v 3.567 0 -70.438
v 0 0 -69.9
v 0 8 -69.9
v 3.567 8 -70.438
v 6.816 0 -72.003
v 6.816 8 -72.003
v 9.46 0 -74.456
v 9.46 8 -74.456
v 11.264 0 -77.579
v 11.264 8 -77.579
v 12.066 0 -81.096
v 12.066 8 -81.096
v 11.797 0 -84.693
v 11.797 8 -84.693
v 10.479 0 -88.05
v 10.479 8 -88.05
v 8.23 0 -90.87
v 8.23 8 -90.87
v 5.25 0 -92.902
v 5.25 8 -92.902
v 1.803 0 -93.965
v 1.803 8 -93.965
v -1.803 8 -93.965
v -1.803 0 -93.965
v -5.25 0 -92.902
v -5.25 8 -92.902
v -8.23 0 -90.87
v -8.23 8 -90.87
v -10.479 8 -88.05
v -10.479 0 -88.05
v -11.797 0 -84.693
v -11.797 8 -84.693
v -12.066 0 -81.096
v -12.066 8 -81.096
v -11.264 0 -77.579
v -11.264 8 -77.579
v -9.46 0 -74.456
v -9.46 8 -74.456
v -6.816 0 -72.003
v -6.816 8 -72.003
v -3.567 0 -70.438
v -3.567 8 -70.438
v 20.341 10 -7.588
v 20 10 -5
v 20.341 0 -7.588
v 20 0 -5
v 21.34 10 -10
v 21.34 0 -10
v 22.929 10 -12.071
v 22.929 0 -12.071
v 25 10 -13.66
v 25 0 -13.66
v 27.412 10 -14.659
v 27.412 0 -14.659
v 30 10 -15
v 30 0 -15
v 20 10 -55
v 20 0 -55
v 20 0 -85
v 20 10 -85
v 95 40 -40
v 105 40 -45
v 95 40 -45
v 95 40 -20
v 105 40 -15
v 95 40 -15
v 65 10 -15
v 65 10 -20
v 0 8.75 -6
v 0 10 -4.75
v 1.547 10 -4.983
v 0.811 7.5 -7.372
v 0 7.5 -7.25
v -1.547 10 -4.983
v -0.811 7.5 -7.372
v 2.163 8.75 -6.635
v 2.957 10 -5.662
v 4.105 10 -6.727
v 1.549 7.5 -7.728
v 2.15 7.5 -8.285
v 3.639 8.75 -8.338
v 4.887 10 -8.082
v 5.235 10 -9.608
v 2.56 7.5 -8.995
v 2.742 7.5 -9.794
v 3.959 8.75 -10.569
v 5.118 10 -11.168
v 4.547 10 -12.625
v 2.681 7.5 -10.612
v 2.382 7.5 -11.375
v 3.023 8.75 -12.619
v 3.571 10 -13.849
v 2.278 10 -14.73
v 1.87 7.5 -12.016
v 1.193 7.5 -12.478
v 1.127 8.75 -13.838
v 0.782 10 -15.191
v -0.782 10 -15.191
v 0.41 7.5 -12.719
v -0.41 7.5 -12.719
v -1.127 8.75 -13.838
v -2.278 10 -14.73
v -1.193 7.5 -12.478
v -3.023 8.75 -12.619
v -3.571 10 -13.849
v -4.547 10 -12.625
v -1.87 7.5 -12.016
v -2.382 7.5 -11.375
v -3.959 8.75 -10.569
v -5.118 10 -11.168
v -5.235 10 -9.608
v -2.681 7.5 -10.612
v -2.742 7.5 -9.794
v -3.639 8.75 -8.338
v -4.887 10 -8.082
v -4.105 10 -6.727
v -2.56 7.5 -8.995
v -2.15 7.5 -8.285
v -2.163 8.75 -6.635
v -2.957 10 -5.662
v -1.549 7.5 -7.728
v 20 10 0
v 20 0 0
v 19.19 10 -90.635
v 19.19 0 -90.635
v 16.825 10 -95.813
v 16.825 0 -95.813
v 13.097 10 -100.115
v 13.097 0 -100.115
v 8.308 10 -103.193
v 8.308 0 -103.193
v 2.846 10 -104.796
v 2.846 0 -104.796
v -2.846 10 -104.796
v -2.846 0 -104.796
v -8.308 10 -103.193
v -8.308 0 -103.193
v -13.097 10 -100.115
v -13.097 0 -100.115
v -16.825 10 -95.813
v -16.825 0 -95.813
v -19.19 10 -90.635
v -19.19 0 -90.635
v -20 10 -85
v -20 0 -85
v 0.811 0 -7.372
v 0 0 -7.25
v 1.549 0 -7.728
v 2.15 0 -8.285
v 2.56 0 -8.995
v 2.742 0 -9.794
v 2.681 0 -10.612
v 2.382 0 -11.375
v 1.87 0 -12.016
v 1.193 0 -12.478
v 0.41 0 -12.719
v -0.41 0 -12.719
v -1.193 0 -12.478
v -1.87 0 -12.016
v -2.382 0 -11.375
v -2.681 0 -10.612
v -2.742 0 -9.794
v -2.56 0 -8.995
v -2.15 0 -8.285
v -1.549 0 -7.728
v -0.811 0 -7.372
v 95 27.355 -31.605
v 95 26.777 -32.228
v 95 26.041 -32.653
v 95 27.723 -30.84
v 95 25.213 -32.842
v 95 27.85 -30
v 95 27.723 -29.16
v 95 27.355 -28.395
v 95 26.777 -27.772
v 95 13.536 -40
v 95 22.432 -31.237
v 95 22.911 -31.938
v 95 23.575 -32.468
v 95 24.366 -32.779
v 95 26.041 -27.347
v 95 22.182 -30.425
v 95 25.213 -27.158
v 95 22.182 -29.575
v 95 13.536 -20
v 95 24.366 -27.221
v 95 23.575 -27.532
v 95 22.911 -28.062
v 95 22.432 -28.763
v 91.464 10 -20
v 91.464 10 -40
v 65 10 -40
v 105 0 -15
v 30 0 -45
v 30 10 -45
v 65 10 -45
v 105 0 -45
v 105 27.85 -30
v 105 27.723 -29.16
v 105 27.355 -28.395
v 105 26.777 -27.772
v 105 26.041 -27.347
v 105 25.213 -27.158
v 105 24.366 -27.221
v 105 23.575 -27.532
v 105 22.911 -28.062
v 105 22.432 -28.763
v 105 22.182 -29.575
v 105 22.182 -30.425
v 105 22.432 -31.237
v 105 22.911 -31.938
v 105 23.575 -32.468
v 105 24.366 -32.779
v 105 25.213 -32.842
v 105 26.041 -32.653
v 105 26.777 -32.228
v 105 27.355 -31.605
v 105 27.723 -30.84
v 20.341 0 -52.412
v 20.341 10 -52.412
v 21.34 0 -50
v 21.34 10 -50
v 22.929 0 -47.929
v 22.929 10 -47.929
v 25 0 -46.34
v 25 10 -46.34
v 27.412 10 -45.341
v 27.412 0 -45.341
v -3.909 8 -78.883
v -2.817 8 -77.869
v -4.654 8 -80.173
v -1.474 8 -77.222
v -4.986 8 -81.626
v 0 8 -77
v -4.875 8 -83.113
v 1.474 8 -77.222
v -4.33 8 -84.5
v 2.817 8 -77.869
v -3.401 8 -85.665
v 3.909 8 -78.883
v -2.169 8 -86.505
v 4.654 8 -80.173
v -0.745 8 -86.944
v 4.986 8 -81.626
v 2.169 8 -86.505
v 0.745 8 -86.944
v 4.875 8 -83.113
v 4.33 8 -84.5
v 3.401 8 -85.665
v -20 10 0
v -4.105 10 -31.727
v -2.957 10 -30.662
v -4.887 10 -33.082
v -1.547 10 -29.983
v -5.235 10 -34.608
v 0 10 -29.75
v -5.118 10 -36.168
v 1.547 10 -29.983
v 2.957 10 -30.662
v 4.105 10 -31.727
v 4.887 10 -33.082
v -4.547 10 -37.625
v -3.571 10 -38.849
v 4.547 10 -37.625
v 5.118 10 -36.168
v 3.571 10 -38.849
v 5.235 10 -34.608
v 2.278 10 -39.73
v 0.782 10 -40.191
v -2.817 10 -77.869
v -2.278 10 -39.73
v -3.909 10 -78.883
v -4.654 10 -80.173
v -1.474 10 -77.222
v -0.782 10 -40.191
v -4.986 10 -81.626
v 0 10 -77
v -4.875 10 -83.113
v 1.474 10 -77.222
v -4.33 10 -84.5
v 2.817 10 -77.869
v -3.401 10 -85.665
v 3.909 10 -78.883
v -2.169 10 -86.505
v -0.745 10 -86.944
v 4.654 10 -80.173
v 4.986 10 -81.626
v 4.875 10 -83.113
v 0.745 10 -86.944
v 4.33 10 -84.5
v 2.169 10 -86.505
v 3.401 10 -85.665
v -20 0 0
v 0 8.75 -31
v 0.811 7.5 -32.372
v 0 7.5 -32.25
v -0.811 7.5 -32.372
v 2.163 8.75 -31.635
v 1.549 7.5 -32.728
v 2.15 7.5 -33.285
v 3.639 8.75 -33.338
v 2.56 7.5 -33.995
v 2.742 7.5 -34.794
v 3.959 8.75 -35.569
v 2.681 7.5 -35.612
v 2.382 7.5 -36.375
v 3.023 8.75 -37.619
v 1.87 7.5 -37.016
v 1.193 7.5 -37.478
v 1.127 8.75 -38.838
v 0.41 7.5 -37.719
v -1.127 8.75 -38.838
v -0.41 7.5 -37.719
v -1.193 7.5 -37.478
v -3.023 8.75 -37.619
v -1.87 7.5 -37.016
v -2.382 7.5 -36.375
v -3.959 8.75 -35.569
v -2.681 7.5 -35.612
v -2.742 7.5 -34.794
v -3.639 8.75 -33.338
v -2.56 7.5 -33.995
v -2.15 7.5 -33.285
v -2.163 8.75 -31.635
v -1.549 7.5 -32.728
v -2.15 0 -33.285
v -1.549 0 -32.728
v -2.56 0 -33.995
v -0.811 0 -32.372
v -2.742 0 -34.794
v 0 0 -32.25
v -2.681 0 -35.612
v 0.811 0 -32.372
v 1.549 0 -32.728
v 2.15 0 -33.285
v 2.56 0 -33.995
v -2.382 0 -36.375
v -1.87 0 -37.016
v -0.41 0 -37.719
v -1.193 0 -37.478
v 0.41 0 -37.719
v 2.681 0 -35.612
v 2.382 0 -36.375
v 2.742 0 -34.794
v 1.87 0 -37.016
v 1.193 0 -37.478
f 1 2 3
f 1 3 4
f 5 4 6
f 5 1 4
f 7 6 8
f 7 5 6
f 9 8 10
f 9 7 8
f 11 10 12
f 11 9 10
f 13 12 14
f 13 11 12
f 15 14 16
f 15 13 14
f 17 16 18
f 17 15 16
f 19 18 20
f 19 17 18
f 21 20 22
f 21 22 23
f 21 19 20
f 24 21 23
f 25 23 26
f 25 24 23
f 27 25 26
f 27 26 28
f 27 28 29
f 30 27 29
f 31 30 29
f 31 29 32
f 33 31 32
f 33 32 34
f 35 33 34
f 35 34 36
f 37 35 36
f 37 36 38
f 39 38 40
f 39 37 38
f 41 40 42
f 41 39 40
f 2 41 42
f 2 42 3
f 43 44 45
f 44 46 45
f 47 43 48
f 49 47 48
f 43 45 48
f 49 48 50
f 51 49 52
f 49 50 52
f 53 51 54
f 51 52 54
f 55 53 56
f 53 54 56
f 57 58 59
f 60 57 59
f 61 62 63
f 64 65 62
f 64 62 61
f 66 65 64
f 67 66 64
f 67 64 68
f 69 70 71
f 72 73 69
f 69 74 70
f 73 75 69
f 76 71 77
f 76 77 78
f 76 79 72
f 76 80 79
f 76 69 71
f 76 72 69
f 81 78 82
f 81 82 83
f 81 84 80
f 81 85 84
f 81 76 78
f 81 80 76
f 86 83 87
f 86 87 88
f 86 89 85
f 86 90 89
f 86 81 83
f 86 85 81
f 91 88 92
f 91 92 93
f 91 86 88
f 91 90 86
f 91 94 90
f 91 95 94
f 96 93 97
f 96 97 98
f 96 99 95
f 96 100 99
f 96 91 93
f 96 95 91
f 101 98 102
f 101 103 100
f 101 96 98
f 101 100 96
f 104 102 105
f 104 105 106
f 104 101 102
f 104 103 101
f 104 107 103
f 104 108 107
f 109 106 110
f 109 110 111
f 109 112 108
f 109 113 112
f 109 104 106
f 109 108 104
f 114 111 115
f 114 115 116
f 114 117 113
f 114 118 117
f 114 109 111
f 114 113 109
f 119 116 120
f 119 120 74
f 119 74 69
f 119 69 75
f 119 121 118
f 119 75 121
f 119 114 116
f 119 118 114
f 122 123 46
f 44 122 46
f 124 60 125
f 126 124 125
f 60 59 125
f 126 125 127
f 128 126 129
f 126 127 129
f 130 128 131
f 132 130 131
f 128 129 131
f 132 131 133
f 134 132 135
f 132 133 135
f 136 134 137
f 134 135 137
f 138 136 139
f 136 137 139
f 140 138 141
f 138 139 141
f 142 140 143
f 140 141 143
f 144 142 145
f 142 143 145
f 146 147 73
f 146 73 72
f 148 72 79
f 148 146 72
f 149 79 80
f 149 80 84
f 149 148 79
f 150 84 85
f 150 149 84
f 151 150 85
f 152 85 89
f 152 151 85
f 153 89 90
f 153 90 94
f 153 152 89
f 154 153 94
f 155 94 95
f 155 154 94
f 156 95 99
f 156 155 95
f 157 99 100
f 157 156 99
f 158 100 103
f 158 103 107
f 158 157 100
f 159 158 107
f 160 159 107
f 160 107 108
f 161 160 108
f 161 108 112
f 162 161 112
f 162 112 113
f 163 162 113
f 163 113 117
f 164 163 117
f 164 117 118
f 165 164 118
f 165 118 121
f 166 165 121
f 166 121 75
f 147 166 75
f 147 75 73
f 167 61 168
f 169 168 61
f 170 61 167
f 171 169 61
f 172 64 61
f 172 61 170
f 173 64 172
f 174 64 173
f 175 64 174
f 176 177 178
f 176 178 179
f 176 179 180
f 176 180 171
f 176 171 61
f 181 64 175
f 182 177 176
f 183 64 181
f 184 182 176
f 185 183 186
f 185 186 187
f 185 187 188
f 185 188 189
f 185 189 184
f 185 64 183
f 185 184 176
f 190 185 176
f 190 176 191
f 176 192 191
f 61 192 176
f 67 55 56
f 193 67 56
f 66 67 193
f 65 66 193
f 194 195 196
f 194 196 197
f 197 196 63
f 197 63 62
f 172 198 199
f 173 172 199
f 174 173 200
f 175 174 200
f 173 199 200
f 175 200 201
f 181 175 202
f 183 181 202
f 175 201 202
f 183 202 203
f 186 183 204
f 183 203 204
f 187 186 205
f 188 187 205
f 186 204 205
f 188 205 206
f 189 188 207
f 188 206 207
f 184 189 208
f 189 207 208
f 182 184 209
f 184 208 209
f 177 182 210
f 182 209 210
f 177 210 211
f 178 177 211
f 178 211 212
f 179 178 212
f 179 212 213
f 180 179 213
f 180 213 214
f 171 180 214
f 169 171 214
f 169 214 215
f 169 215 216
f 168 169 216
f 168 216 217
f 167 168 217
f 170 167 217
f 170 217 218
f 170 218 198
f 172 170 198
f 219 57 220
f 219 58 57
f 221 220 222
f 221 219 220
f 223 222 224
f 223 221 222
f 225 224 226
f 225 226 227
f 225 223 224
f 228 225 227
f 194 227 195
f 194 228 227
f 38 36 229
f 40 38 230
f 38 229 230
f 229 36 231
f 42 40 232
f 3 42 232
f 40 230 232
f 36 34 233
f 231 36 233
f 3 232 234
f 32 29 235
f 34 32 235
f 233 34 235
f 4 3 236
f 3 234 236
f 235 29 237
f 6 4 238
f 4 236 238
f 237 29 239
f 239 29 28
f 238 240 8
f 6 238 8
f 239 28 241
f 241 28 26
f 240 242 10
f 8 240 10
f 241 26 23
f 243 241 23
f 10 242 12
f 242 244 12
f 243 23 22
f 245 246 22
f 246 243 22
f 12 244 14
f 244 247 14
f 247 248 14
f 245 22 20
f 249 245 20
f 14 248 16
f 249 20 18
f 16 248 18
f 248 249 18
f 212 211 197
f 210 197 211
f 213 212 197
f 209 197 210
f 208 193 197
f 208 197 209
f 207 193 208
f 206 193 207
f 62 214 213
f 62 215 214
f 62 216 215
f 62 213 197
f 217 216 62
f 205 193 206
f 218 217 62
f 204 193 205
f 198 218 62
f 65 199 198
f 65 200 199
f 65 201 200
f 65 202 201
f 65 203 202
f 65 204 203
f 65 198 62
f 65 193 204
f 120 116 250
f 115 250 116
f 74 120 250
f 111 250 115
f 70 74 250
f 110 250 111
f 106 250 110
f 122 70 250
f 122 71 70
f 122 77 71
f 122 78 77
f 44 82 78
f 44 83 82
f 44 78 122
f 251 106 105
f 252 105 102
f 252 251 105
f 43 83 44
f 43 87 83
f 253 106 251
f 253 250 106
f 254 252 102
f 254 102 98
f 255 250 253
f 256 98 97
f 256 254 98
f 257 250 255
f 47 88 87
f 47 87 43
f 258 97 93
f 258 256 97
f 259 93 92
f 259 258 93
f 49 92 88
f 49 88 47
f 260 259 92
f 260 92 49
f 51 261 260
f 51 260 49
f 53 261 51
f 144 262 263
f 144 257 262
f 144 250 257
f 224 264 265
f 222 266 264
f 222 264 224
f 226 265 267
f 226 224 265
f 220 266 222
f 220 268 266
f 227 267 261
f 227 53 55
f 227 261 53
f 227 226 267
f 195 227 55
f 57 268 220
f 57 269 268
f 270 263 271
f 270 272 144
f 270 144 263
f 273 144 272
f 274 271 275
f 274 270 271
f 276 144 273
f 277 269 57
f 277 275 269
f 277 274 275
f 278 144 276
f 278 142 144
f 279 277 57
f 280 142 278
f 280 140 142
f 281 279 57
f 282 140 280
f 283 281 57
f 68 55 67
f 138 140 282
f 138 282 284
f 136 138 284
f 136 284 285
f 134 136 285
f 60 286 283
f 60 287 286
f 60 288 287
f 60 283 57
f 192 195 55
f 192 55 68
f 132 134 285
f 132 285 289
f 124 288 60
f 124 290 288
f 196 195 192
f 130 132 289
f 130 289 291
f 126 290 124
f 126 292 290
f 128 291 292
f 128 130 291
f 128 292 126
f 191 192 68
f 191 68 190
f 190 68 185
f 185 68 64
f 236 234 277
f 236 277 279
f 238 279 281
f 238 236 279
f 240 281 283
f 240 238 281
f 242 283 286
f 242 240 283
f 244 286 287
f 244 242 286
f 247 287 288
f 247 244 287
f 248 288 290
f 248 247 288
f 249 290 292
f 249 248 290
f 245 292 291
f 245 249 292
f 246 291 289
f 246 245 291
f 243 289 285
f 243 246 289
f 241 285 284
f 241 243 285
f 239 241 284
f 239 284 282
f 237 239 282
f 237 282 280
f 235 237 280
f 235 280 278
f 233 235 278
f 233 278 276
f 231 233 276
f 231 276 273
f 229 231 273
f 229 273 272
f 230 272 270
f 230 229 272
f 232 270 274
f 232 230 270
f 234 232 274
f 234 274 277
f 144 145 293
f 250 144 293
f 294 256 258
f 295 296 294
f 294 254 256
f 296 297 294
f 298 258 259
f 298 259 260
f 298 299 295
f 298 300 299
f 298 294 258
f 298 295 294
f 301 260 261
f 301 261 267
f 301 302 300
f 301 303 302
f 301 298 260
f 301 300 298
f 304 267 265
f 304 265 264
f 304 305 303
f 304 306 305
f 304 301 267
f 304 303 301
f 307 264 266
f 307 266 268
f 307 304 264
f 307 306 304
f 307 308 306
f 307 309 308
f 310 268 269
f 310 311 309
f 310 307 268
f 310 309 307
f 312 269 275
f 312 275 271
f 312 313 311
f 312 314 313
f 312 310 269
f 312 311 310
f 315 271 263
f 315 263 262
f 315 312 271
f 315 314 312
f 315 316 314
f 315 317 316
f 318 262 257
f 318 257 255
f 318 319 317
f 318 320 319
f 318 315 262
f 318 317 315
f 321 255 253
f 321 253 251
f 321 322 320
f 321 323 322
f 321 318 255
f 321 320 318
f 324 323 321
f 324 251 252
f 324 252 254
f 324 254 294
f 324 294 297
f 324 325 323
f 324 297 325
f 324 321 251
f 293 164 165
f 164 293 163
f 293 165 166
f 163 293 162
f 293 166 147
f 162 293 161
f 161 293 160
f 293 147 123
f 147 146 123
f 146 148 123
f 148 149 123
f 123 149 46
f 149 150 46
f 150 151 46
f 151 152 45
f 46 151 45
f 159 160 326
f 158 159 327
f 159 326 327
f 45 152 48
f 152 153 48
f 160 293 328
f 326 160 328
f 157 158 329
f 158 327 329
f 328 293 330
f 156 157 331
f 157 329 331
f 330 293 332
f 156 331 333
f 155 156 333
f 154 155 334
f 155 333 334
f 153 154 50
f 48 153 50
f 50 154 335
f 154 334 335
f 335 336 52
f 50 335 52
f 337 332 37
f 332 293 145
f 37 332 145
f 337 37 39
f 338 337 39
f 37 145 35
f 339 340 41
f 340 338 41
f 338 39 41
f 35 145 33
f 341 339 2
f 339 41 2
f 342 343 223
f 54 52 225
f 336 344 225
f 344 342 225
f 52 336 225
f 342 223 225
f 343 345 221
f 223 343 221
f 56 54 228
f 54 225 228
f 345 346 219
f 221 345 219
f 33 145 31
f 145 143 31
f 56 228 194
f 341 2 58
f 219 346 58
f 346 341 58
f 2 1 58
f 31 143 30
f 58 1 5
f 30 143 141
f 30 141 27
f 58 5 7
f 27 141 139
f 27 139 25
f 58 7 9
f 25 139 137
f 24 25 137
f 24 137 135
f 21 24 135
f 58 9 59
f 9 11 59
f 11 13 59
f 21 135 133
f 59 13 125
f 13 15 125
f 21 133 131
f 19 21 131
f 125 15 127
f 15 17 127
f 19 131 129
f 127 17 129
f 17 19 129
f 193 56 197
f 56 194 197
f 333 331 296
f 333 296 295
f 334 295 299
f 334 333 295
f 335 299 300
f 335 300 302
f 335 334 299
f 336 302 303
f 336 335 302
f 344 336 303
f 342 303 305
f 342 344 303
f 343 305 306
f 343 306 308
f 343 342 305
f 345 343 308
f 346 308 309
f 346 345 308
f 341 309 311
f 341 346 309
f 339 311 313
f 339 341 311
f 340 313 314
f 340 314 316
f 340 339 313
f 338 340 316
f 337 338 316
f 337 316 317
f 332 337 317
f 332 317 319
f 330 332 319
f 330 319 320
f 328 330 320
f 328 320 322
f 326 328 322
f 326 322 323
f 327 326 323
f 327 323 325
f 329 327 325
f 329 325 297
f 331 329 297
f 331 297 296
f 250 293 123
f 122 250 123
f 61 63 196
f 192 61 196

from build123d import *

# Parameters (mm, degrees)
SKETCH1_R           = 2.75
SKETCH1_R_2         = 12.1
BOSS_EXTRUDE1_DEPTH = 8
SKETCH3_R           = 2.75
SKETCH3_R_2         = 5
BOSS_EXTRUDE3_DEPTH = 2
BOSS_EXTRUDE4_DEPTH = 15
FILLET1_R           = 10
SKETCH5_R           = 2.85
CUT_EXTRUDE1_DEPTH  = 40
BOSS_EXTRUDE5_DEPTH = 5
CHAMFER1_SIZE       = 2.5


with BuildPart() as part:
    # Sketch1 → Boss-Extrude1 (new body)
    with BuildSketch(Plane(origin=(0, 0, 0), x_dir=(1, 0, 0), z_dir=(0, 1, 0))):
        with BuildLine():
            Line((-20, 0), (20, 0))
            Line((20, 0), (20, 85))
            ThreePointArc((20, 85), (0, 105), (-20, 85))
            Line((-20, 85), (-20, 0))
        make_face()
        with Locations(Location((0, 10, 0), (0, 0, 270))):
            Circle(SKETCH1_R, mode=Mode.SUBTRACT)
        with Locations(Location((0, 82, 0), (0, 0, 270))):
            Circle(SKETCH1_R_2, mode=Mode.SUBTRACT)
        with Locations(Location((0, 35, 0), (0, 0, 270))):
            Circle(SKETCH1_R, mode=Mode.SUBTRACT)
    extrude(amount=BOSS_EXTRUDE1_DEPTH)

    # Sketch3 → Boss-Extrude3 (add)
    with BuildSketch(Plane(origin=(0, 8, 0), x_dir=(1, 0, 0), z_dir=(0, 1, 0))):
        with BuildLine():
            Line((-20, 0), (20, 0))
            Line((20, 0), (20, 85))
            ThreePointArc((20, 85), (0, 105), (-20, 85))
            Line((-20, 85), (-20, 0))
        make_face()
        with Locations(Location((0, 10, 0), (0, 0, 270))):
            Circle(SKETCH3_R, mode=Mode.SUBTRACT)
        with Locations(Location((0, 35, 0), (0, 0, 270))):
            Circle(SKETCH3_R, mode=Mode.SUBTRACT)
        with Locations(Location((0, 82, 0), (0, 0, 270))):
            Circle(SKETCH3_R_2, mode=Mode.SUBTRACT)
    extrude(amount=BOSS_EXTRUDE3_DEPTH)

    # Sketch4 → Boss-Extrude4 (add, symmetric)
    with BuildSketch(Plane.XY.offset(-30)):
        Polygon((20, 0), (105, 0), (105, 40), (95, 40), (95, 13.535533906), (91.464466094, 10), (20, 10), align=None)
    extrude(amount=BOSS_EXTRUDE4_DEPTH, both=True)

    # Fillet1
    fillet1_edges = [part.edges().sort_by_distance(p)[0] for p in [
        (20, 5, -45),
        (20, 5, -15),
    ]]
    fillet(fillet1_edges, radius=FILLET1_R)

    # Sketch5 → Cut-Extrude1 (cut)
    with BuildSketch(Plane(origin=(105, 0, 0), x_dir=(0, 0, -1), z_dir=(1, 0, 0))):
        with Locations(Location((30, 25, 0), (0, 0, 90))):
            Circle(SKETCH5_R)
    extrude(amount=-CUT_EXTRUDE1_DEPTH, mode=Mode.SUBTRACT)

    # Sketch6 → Boss-Extrude5 (add)
    with BuildSketch(Plane.XY.offset(-15)):
        Polygon((65, 10), (95, 10), (95, 40), align=None)
    boss_extrude5 = extrude(amount=-BOSS_EXTRUDE5_DEPTH)

    # Mirror1: Boss-Extrude5 across plane
    add(boss_extrude5.mirror(Plane.XY.offset(-30)))

    # Chamfer1
    chamfer1_edges = [part.edges().sort_by_distance(p)[0] for p in [
        (0, 10, -12.75),
        (0, 10, -37.75),
    ]]
    chamfer(chamfer1_edges, length=CHAMFER1_SIZE)


solid = part.part
